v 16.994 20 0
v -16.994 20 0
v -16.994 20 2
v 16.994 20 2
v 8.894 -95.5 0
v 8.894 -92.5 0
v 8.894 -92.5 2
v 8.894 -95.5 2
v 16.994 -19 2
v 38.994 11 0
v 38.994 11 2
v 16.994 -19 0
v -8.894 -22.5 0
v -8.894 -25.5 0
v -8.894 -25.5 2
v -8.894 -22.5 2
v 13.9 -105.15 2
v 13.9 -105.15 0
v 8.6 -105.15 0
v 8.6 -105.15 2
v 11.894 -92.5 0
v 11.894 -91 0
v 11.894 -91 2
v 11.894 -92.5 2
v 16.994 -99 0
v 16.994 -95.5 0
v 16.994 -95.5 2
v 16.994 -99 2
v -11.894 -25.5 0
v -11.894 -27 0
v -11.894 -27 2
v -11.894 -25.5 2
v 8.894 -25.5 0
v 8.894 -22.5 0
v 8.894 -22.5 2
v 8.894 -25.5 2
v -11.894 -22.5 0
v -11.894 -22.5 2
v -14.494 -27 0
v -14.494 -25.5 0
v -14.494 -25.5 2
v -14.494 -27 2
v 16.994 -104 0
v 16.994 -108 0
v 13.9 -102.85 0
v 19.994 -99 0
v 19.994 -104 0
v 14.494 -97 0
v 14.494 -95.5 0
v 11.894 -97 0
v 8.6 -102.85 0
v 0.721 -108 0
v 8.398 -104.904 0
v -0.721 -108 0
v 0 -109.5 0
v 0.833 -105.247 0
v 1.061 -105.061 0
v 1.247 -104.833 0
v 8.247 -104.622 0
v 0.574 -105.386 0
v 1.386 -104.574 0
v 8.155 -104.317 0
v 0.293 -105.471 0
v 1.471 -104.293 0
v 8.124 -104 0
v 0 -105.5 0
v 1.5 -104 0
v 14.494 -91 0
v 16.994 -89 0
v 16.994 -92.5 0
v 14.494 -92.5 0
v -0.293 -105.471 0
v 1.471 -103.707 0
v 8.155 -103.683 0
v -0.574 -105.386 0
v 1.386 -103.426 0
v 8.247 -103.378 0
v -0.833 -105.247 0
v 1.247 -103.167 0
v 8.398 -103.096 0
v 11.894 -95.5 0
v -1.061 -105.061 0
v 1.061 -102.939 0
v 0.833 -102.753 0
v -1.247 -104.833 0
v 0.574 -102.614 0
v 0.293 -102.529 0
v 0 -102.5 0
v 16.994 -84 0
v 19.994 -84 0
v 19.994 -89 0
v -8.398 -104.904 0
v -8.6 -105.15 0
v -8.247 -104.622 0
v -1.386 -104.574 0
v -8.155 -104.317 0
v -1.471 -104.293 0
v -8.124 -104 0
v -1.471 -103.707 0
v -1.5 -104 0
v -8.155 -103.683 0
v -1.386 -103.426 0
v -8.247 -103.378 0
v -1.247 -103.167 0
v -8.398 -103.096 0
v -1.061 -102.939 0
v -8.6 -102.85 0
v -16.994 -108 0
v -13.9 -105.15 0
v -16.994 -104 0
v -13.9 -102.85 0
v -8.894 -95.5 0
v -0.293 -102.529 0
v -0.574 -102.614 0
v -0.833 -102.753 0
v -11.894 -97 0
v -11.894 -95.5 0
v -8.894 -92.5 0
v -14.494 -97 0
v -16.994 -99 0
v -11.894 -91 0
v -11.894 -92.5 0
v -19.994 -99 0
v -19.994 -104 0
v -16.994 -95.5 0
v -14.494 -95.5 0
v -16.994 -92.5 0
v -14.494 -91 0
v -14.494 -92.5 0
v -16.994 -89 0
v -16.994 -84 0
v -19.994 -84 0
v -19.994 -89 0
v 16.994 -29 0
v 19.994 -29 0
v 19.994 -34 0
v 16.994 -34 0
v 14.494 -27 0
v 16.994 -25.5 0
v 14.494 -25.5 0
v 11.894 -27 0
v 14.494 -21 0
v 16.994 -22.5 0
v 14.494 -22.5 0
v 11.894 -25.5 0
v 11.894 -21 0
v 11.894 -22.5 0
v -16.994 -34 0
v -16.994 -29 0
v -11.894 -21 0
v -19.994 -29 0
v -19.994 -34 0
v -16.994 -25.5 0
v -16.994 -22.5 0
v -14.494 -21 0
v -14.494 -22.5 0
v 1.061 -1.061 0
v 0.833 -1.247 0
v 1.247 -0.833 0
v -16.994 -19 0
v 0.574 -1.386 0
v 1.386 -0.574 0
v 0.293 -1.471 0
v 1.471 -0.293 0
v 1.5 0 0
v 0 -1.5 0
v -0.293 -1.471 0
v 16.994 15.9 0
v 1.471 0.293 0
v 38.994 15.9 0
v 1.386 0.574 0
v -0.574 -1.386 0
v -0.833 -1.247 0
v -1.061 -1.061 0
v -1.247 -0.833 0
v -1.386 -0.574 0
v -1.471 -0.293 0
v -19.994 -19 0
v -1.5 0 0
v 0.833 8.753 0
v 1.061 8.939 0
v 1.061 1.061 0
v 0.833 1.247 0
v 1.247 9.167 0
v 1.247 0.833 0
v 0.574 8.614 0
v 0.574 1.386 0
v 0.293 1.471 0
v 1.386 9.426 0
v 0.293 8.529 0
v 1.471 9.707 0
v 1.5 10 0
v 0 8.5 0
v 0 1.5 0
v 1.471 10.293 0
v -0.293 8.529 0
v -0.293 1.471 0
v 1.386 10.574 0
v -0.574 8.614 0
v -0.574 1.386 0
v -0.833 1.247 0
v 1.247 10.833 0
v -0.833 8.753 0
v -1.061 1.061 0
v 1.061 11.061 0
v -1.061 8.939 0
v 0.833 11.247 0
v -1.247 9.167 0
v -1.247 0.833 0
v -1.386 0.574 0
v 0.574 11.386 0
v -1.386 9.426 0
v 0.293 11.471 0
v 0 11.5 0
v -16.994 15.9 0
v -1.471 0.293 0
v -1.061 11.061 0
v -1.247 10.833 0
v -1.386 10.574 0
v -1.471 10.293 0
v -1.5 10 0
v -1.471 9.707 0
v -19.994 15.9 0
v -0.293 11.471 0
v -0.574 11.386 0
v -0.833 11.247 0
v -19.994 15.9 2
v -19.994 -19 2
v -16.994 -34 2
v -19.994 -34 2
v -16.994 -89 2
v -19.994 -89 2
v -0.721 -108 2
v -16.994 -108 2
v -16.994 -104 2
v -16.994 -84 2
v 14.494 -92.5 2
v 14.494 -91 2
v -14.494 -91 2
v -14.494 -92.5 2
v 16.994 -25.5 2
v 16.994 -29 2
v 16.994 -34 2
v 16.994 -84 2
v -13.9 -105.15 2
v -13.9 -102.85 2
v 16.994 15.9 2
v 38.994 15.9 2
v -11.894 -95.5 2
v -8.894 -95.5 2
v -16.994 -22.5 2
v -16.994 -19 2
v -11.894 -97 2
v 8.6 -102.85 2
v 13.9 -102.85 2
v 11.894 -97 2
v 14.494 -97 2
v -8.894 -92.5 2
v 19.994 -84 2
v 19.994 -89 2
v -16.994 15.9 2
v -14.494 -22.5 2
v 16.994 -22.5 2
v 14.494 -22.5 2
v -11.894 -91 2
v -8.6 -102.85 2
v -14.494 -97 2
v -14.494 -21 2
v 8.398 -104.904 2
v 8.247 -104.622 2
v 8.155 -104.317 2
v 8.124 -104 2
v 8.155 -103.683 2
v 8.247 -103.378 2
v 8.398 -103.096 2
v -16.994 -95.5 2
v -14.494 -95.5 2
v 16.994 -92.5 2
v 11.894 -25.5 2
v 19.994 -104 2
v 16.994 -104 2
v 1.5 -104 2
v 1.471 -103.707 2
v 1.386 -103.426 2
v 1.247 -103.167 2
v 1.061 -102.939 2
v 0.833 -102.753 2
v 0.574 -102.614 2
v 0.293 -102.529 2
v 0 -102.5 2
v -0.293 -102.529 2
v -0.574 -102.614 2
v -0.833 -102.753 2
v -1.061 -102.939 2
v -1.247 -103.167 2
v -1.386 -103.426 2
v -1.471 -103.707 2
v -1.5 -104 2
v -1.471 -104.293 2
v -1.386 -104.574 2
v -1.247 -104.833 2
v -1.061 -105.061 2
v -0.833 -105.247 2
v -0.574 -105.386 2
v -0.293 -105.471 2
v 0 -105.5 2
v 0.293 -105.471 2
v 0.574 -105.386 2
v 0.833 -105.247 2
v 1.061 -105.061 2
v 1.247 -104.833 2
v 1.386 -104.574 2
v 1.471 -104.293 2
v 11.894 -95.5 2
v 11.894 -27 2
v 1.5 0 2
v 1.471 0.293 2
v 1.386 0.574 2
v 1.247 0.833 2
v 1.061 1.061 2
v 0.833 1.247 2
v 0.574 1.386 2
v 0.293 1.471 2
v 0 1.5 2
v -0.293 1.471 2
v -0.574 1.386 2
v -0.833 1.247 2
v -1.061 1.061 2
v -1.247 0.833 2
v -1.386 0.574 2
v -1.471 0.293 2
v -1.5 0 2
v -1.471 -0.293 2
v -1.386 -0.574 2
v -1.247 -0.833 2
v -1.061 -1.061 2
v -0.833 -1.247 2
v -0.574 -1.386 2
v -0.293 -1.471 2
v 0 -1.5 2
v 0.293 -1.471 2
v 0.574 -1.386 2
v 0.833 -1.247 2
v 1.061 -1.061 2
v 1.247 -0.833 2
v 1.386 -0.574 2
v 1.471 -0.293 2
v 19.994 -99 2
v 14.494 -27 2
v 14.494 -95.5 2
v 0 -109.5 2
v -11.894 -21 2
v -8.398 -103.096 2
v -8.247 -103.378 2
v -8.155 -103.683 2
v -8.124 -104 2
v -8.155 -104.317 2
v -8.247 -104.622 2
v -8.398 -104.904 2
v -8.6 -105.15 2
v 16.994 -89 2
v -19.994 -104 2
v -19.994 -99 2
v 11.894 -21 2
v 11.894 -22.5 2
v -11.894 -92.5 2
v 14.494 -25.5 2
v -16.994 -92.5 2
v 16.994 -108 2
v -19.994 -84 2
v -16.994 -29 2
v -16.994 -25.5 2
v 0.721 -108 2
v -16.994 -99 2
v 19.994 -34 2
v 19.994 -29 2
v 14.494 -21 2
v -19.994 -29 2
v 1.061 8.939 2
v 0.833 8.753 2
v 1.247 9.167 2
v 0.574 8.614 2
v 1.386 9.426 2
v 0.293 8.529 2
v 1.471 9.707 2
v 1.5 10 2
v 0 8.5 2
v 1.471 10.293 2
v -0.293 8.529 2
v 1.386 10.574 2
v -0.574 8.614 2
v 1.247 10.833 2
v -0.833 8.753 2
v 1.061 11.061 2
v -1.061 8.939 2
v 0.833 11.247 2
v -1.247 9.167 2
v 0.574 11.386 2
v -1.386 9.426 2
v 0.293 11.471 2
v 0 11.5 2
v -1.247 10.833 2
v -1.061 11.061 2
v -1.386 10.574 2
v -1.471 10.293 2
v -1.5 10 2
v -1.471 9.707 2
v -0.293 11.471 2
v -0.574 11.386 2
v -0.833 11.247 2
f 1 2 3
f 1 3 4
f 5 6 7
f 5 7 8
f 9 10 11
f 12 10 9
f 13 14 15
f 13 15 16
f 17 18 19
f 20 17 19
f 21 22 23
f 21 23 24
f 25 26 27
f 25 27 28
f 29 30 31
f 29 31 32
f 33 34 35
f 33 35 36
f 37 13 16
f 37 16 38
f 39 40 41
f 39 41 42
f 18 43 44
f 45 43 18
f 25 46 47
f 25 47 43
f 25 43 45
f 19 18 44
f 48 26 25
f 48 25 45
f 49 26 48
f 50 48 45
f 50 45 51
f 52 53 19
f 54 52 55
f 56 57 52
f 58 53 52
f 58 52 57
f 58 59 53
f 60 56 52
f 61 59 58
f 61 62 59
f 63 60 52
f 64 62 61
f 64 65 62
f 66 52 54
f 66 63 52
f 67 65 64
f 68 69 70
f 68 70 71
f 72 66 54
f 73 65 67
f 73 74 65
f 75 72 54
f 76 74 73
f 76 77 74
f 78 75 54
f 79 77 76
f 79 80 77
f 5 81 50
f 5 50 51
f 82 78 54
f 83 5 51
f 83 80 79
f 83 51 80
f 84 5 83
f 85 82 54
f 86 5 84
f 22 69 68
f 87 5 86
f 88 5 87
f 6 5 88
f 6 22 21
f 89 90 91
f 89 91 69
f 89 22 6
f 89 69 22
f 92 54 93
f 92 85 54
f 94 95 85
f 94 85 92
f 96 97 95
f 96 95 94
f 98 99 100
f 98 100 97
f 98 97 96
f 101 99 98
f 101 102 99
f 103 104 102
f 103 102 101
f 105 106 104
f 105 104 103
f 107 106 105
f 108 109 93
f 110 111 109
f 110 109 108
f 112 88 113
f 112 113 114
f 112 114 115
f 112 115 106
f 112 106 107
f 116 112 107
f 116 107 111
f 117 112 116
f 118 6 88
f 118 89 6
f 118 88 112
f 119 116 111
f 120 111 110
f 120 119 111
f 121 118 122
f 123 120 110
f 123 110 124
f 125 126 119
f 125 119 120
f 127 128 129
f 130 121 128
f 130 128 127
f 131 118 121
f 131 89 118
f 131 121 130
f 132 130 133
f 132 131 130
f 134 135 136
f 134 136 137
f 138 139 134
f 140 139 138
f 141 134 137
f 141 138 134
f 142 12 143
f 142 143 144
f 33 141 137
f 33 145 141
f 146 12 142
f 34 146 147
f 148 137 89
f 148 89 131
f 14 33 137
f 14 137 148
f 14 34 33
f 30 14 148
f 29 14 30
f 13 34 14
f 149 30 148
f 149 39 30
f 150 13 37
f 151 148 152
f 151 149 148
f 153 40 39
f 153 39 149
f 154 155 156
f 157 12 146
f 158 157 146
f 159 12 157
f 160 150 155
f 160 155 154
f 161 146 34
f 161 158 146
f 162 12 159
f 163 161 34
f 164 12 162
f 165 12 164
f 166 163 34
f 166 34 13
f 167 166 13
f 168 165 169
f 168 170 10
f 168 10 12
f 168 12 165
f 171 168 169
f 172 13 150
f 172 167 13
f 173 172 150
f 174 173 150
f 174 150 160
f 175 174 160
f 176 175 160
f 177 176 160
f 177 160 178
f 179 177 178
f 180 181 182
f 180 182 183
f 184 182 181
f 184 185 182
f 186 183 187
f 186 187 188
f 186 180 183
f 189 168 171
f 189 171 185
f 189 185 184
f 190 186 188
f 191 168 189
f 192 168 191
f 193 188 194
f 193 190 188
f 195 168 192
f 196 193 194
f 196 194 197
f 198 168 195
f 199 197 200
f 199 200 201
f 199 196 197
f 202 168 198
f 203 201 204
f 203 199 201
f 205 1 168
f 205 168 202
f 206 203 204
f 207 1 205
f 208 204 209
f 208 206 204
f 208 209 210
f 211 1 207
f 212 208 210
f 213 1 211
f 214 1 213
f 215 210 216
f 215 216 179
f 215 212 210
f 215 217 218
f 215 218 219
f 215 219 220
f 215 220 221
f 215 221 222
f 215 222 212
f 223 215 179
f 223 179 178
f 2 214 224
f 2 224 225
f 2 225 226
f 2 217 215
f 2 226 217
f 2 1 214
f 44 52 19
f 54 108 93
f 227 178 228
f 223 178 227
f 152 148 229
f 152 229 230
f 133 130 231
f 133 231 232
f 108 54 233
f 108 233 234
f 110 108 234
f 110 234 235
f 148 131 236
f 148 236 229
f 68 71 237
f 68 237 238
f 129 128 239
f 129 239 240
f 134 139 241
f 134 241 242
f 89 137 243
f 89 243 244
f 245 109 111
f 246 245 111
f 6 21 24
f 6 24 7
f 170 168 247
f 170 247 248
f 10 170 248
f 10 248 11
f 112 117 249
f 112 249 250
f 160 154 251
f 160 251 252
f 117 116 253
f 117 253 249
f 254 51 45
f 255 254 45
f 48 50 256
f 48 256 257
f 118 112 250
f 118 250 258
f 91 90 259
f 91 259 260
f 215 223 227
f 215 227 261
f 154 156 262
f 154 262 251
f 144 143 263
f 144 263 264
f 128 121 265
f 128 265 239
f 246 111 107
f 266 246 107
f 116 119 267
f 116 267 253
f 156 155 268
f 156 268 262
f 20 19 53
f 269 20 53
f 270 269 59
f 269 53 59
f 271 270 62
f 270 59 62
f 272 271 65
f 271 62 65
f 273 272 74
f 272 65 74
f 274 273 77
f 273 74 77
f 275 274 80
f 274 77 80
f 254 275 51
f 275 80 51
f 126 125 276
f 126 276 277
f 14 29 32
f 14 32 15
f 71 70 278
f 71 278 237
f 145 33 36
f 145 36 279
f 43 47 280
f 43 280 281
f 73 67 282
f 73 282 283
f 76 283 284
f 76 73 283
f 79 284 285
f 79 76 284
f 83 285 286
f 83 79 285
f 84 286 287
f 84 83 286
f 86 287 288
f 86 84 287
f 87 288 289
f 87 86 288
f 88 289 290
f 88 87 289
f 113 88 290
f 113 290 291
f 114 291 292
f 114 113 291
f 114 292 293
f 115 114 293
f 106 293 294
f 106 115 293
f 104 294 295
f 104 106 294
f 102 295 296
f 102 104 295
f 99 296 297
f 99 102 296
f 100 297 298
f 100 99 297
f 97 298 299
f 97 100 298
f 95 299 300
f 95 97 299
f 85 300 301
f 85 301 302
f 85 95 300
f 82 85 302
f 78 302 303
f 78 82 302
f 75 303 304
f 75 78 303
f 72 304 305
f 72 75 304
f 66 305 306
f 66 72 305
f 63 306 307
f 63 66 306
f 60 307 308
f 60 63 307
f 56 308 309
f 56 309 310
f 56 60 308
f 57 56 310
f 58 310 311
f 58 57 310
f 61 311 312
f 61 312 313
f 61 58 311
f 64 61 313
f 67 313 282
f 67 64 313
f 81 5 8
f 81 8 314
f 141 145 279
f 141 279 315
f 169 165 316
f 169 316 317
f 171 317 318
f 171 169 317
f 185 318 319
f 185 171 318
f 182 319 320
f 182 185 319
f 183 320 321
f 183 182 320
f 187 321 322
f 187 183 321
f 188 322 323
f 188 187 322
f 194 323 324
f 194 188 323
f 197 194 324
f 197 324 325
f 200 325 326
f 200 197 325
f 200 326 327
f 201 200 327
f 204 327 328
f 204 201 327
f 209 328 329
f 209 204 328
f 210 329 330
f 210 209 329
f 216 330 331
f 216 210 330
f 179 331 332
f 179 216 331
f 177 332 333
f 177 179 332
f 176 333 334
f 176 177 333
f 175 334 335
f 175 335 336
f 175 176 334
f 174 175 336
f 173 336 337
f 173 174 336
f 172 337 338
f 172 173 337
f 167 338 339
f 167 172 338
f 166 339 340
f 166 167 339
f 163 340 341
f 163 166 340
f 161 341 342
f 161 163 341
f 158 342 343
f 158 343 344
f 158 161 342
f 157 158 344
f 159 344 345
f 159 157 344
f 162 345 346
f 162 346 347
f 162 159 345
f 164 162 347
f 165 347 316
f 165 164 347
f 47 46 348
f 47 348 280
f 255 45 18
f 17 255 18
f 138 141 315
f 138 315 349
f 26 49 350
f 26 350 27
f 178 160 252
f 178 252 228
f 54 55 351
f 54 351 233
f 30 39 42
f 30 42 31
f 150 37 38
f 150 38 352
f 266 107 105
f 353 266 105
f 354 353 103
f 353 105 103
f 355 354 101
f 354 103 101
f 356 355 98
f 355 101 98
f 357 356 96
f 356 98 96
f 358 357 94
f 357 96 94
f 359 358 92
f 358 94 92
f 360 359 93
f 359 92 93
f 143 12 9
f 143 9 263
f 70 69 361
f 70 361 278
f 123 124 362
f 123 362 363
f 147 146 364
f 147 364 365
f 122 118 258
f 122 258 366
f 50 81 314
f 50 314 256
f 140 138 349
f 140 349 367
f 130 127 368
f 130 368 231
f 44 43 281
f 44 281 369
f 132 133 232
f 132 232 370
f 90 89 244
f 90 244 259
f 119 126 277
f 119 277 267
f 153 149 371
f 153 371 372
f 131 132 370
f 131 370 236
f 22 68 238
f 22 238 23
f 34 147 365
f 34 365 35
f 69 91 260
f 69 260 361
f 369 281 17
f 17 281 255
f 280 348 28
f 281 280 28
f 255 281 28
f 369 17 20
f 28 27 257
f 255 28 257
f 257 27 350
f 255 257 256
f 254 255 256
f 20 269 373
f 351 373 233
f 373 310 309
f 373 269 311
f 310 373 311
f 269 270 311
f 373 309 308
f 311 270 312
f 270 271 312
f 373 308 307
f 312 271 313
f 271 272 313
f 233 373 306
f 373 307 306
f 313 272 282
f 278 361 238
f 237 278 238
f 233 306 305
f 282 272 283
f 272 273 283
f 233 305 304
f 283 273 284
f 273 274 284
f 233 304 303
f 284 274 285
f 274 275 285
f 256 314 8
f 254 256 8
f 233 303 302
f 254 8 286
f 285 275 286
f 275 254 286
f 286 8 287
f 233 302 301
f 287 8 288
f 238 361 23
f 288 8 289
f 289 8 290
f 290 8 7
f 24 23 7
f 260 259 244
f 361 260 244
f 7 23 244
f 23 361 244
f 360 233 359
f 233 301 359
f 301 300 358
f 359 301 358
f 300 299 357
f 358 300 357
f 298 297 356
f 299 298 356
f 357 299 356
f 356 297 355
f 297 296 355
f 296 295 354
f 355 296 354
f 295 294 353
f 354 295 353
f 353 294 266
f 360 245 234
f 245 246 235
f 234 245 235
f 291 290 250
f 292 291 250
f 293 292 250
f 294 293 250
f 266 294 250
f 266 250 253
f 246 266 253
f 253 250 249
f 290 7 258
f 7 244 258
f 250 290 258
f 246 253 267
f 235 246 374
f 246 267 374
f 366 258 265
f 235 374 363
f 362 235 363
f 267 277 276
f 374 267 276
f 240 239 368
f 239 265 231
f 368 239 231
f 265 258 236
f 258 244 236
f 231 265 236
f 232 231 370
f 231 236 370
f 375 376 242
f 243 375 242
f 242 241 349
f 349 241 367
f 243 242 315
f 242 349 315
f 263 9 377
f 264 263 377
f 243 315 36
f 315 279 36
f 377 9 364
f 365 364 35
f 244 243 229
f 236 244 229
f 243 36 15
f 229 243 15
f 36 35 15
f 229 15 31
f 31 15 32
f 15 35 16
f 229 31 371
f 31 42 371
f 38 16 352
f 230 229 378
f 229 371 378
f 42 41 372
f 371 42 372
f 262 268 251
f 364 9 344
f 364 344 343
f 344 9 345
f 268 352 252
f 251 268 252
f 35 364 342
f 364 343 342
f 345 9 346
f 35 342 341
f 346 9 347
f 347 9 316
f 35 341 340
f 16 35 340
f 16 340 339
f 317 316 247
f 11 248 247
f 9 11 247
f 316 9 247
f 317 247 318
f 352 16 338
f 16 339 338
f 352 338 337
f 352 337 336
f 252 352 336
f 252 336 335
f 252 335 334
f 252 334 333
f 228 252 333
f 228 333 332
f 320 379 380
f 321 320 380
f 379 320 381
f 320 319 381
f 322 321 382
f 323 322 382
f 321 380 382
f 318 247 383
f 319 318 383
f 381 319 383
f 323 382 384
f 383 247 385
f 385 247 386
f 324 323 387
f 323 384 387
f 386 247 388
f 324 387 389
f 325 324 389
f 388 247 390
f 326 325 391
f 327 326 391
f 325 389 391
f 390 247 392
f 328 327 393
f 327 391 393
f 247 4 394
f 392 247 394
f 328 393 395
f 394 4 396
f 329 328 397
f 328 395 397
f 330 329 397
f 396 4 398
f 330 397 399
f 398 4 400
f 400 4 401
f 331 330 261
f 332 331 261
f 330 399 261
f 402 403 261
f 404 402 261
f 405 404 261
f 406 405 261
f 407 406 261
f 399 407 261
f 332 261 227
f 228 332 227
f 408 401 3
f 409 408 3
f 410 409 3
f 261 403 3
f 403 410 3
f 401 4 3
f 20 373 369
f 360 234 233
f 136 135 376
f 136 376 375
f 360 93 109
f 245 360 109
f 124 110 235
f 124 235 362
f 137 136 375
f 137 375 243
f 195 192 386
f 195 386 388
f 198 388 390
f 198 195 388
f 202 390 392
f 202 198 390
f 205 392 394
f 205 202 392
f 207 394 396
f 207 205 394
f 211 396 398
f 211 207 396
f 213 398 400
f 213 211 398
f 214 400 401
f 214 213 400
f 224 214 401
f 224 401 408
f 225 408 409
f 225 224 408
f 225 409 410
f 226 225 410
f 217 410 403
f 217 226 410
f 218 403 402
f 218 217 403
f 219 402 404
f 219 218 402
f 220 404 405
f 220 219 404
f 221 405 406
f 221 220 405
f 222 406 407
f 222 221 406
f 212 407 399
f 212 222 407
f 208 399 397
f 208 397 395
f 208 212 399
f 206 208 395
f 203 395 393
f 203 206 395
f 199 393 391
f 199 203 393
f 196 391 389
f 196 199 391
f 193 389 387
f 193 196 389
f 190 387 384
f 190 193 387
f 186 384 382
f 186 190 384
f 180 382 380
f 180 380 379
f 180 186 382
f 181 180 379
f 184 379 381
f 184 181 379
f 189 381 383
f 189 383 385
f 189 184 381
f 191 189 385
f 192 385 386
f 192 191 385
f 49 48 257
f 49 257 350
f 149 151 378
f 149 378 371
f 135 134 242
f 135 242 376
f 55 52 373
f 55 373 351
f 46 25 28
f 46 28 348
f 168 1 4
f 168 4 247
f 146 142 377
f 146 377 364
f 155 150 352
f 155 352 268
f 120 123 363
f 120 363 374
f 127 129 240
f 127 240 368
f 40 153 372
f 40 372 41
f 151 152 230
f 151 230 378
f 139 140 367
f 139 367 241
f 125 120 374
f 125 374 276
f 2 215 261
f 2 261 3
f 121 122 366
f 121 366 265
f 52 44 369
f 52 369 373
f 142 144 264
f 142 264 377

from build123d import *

# Parameters (mm, degrees)
SKETCH_1_R      = 1.5
EXTRUDE_1_DEPTH = 2


with BuildPart() as part:
    # 草图1 → 凸台-拉伸1 (new body)
    with BuildSketch(Plane.XY):
        Polygon((16.993865071, -34), (16.993865071, -84), (19.993865071, -84), (19.993865071, -89), (16.993865071, -89), (16.993865071, -92.5), (14.493865071, -92.5), (14.493865071, -91), (11.893865071, -91), (11.893865071, -92.5), (8.893865071, -92.5), (8.893865071, -95.5), (11.893865071, -95.5), (11.893865071, -97), (14.493865071, -97), (14.493865071, -95.5), (16.993865071, -95.5), (16.993865071, -99), (19.993865071, -99), (19.993865071, -104), (16.993865071, -104), (16.993865071, -108), (0.721190694, -108), (0, -109.5), (-0.721190694, -108), (-16.993865071, -108), (-16.993865071, -104), (-19.993865071, -104), (-19.993865071, -99), (-16.993865071, -99), (-16.993865071, -95.5), (-14.493865071, -95.5), (-14.493865071, -97), (-11.893865071, -97), (-11.893865071, -95.5), (-8.893865071, -95.5), (-8.893865071, -92.5), (-11.893865071, -92.5), (-11.893865071, -91), (-14.493865071, -91), (-14.493865071, -92.5), (-16.993865071, -92.5), (-16.993865071, -89), (-19.993865071, -89), (-19.993865071, -84), (-16.993865071, -84), (-16.993865071, -34), (-19.993865071, -34), (-19.993865071, -29), (-16.993865071, -29), (-16.993865071, -25.5), (-14.493865071, -25.5), (-14.493865071, -27), (-11.893865071, -27), (-11.893865071, -25.5), (-8.893865071, -25.5), (-8.893865071, -22.5), (-11.893865071, -22.5), (-11.893865071, -21), (-14.493865071, -21), (-14.493865071, -22.5), (-16.993865071, -22.5), (-16.993865071, -19), (-19.993865071, -19), (-19.993865071, 15.9), (-16.993865071, 15.9), (-16.993865071, 20), (16.993865071, 20), (16.993865071, 15.9), (38.993865071, 15.9), (38.993865071, 11), (16.993865071, -19), (16.993865071, -22.5), (14.493865071, -22.5), (14.493865071, -21), (11.893865071, -21), (11.893865071, -22.5), (8.893865071, -22.5), (8.893865071, -25.5), (11.893865071, -25.5), (11.893865071, -27), (14.493865071, -27), (14.493865071, -25.5), (16.993865071, -25.5), (16.993865071, -29), (19.993865071, -29), (19.993865071, -34), align=None)
        with Locations((0, -104)):
            Circle(SKETCH_1_R, mode=Mode.SUBTRACT)
        Circle(SKETCH_1_R, mode=Mode.SUBTRACT)
        with Locations((0, 10)):
            Circle(SKETCH_1_R, mode=Mode.SUBTRACT)
        with BuildLine():
            Line((13.9, -105.15), (8.6, -105.15))
            ThreePointArc((8.6, -105.15), (8.123654403, -104), (8.6, -102.85))
            Line((8.6, -102.85), (13.9, -102.85))
            Line((13.9, -102.85), (13.9, -105.15))
        make_face(mode=Mode.SUBTRACT)
        with BuildLine():
            Line((-13.9, -102.85), (-8.6, -102.85))
            ThreePointArc((-8.6, -102.85), (-8.123654403, -104), (-8.6, -105.15))
            Line((-8.6, -105.15), (-13.9, -105.15))
            Line((-13.9, -105.15), (-13.9, -102.85))
        make_face(mode=Mode.SUBTRACT)
    extrude(amount=EXTRUDE_1_DEPTH)


solid = part.part
